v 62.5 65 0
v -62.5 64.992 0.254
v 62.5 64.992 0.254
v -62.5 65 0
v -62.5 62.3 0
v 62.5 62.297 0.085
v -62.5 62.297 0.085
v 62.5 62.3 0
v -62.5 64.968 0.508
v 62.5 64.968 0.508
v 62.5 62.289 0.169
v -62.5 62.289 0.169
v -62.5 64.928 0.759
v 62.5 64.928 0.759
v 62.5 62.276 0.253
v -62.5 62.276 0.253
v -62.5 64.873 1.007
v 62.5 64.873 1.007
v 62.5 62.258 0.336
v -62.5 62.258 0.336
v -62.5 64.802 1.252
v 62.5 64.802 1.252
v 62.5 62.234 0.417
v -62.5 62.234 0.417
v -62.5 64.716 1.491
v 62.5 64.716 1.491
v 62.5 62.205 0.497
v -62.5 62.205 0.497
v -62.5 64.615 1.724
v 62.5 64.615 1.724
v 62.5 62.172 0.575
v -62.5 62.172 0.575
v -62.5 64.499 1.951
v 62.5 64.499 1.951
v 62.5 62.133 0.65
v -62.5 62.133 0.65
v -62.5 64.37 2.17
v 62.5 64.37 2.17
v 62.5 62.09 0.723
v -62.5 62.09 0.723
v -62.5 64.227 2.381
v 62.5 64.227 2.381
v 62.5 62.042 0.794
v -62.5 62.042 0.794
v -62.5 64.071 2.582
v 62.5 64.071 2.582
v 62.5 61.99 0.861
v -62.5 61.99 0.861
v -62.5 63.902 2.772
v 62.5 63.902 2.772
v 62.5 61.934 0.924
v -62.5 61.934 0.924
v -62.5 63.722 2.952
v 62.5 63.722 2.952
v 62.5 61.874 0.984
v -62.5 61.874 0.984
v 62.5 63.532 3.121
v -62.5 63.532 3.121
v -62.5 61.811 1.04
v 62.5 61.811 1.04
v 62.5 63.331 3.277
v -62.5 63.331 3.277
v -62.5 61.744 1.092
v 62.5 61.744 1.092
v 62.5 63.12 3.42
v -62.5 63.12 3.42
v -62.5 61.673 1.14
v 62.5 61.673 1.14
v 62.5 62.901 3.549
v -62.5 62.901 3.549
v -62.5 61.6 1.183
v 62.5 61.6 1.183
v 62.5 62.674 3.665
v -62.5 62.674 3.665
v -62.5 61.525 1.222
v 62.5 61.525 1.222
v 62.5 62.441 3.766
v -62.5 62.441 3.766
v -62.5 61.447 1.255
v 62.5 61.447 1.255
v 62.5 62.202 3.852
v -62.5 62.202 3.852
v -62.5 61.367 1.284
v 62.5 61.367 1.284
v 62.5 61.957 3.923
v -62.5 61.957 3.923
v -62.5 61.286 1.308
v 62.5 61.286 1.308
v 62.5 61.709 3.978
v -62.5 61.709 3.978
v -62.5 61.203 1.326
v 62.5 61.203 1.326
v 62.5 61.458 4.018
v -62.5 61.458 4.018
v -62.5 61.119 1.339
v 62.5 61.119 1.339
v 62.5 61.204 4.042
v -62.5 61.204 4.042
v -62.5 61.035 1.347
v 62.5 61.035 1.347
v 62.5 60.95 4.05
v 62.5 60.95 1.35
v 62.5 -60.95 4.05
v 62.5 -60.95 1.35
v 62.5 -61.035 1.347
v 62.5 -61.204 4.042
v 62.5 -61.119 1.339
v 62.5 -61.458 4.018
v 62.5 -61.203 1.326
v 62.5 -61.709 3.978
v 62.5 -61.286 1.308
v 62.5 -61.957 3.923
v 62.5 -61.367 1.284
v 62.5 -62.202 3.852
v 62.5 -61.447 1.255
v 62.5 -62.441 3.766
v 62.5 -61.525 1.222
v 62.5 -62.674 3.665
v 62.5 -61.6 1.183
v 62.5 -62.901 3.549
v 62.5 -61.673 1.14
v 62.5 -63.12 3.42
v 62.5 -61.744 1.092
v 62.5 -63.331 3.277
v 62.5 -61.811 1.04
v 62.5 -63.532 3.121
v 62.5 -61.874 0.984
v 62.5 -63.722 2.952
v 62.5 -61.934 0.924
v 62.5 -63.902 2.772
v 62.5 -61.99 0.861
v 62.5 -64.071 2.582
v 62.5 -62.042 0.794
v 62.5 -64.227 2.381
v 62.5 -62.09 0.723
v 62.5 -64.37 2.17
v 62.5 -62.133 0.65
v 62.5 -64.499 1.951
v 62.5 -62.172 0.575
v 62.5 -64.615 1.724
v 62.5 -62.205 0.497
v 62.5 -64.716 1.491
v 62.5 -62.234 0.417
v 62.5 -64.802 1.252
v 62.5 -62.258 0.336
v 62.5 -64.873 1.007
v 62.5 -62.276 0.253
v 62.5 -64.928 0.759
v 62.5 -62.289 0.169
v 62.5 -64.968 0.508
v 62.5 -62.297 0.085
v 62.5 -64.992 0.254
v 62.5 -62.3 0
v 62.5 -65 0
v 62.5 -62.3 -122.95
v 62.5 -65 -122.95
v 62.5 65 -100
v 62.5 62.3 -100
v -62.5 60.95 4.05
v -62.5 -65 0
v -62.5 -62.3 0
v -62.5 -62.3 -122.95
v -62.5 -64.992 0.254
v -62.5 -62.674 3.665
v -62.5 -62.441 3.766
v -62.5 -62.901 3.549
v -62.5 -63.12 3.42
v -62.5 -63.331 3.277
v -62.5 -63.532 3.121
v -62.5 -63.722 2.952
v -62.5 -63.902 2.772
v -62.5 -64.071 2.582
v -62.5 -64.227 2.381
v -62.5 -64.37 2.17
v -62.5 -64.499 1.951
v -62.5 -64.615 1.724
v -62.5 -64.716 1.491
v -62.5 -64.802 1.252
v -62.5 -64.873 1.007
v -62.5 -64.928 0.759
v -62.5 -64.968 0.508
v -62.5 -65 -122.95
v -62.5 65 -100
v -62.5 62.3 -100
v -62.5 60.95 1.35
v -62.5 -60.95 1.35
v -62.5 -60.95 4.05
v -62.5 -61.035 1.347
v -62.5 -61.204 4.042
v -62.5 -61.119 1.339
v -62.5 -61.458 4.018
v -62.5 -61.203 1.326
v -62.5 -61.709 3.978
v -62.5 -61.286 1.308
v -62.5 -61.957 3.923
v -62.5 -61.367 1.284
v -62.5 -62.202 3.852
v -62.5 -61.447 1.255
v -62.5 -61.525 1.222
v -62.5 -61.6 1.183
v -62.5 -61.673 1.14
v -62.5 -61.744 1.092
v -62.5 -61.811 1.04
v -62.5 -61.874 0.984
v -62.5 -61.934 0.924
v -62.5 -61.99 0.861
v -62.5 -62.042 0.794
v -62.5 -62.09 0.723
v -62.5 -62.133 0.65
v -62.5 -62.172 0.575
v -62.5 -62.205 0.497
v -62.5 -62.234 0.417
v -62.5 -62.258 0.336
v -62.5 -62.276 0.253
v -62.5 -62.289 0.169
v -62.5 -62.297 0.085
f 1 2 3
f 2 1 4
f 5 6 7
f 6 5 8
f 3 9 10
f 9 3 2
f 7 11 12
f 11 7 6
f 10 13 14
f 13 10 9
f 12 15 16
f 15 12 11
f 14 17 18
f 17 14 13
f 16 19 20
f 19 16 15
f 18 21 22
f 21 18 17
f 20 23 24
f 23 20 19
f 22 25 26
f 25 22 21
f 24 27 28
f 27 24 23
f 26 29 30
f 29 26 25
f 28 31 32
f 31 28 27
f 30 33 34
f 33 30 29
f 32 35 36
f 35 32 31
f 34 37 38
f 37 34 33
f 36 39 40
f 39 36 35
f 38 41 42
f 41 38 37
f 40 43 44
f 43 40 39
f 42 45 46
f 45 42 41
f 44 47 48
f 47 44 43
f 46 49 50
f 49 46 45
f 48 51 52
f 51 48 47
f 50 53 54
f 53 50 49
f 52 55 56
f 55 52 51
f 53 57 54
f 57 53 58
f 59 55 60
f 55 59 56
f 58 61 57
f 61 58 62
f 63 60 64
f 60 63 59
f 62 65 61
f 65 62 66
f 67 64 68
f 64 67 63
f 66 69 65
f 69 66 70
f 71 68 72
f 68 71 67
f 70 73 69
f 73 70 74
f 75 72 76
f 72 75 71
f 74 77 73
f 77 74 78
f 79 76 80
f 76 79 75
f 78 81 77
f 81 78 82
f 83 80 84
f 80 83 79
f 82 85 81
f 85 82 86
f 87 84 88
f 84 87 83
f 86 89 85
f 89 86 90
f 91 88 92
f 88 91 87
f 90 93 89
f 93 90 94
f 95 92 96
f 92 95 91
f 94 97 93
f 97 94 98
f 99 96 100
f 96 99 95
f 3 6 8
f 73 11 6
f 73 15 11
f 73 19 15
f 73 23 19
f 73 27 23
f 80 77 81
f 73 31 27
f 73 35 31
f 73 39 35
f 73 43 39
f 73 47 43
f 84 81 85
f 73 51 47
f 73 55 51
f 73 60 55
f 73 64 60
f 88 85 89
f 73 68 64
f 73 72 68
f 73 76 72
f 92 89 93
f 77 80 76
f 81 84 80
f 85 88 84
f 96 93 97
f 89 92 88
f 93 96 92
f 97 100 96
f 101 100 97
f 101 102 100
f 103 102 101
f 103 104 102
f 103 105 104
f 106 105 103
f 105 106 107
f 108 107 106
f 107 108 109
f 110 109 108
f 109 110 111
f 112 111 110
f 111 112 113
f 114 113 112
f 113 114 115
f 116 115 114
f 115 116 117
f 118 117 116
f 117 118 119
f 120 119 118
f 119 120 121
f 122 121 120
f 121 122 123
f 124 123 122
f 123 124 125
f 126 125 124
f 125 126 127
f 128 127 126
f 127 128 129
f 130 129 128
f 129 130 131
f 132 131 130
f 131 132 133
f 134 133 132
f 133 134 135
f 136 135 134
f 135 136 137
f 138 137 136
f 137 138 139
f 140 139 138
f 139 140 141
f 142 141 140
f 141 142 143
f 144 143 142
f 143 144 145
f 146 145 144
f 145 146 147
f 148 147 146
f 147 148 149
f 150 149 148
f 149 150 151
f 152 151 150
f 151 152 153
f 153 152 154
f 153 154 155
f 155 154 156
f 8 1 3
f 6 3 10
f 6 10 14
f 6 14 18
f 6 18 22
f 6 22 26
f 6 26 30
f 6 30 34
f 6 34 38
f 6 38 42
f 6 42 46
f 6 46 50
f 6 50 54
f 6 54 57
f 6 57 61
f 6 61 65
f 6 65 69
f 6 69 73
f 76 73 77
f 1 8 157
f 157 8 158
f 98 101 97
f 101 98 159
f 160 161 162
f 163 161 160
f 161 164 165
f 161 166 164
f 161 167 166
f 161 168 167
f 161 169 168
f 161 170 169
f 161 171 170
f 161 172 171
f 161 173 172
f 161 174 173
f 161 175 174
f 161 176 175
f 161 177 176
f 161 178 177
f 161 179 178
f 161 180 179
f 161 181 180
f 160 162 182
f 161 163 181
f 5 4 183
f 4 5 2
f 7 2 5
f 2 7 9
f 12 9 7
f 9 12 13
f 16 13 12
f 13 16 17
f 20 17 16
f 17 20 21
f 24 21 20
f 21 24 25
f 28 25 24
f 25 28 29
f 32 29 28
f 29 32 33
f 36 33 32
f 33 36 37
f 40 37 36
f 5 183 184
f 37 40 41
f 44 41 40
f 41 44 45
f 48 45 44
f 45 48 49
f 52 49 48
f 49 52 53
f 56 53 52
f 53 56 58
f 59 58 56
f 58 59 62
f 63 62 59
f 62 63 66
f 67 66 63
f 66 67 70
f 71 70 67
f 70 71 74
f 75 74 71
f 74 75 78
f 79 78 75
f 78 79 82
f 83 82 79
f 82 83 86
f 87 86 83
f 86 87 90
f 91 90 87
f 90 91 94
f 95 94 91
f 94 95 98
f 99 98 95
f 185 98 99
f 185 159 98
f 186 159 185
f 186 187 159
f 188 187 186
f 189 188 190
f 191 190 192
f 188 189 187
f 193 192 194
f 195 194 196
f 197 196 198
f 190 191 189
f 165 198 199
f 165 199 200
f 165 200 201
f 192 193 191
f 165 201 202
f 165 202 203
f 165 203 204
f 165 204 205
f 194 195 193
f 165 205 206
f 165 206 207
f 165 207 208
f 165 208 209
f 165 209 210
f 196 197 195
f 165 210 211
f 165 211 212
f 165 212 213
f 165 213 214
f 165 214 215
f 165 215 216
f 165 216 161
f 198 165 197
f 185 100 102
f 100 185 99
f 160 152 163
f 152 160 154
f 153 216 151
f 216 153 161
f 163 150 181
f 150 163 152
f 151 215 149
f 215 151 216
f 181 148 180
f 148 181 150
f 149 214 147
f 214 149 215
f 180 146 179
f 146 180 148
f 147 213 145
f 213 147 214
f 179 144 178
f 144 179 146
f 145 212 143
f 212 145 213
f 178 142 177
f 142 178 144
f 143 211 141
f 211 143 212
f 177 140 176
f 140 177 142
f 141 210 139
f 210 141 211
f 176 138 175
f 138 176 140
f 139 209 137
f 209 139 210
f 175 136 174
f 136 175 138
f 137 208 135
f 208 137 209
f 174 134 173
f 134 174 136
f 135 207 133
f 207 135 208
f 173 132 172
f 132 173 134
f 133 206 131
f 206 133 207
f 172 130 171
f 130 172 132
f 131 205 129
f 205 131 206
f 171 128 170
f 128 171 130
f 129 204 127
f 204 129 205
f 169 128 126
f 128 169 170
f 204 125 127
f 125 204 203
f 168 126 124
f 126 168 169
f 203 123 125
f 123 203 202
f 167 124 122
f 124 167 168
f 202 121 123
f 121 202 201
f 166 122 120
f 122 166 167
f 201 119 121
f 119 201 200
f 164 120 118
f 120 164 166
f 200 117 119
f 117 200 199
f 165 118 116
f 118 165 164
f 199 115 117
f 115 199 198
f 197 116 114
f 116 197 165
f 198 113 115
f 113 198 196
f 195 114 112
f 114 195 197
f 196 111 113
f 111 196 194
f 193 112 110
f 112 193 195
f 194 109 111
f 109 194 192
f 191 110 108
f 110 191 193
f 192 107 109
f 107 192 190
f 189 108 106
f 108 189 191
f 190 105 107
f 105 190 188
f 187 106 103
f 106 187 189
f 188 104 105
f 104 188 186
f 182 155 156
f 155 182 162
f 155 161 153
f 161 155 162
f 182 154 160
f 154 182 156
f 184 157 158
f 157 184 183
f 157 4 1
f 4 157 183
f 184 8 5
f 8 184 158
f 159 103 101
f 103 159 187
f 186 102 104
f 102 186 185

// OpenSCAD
// Parameters
$fn = 100; // Increase for smoother bends
thickness = 2.7; // Thickness of the plexiglass
width=130-3*thickness;
length=125;
height1=127-1.5*thickness;
height2=100;
color("#0000a040") union() {
    rotate([0,0,90]) {
        translate([width/2, 0, 0]) rotate([90,0,0]) rotate_extrude(angle=90)
        translate([thickness,0, 0])
            square([thickness, length], center=true);
            
        translate([-width/2, 0, 0]) rotate([90,0,180]) rotate_extrude(angle=90)
        translate([thickness,0, 0])
            square([thickness, length], center=true);    
    }
    translate([0, -width/2 -thickness, -height1/2]) cube([length, thickness, height1], center=true);
    translate([0, width/2 +thickness, -height2/2]) cube([length, thickness, height2], center=true);

    translate([0,0,thickness]) cube([length, width, thickness], center=true);
}
//translate([0,0,-59.4])cube([125, 130, 127], center=true);
